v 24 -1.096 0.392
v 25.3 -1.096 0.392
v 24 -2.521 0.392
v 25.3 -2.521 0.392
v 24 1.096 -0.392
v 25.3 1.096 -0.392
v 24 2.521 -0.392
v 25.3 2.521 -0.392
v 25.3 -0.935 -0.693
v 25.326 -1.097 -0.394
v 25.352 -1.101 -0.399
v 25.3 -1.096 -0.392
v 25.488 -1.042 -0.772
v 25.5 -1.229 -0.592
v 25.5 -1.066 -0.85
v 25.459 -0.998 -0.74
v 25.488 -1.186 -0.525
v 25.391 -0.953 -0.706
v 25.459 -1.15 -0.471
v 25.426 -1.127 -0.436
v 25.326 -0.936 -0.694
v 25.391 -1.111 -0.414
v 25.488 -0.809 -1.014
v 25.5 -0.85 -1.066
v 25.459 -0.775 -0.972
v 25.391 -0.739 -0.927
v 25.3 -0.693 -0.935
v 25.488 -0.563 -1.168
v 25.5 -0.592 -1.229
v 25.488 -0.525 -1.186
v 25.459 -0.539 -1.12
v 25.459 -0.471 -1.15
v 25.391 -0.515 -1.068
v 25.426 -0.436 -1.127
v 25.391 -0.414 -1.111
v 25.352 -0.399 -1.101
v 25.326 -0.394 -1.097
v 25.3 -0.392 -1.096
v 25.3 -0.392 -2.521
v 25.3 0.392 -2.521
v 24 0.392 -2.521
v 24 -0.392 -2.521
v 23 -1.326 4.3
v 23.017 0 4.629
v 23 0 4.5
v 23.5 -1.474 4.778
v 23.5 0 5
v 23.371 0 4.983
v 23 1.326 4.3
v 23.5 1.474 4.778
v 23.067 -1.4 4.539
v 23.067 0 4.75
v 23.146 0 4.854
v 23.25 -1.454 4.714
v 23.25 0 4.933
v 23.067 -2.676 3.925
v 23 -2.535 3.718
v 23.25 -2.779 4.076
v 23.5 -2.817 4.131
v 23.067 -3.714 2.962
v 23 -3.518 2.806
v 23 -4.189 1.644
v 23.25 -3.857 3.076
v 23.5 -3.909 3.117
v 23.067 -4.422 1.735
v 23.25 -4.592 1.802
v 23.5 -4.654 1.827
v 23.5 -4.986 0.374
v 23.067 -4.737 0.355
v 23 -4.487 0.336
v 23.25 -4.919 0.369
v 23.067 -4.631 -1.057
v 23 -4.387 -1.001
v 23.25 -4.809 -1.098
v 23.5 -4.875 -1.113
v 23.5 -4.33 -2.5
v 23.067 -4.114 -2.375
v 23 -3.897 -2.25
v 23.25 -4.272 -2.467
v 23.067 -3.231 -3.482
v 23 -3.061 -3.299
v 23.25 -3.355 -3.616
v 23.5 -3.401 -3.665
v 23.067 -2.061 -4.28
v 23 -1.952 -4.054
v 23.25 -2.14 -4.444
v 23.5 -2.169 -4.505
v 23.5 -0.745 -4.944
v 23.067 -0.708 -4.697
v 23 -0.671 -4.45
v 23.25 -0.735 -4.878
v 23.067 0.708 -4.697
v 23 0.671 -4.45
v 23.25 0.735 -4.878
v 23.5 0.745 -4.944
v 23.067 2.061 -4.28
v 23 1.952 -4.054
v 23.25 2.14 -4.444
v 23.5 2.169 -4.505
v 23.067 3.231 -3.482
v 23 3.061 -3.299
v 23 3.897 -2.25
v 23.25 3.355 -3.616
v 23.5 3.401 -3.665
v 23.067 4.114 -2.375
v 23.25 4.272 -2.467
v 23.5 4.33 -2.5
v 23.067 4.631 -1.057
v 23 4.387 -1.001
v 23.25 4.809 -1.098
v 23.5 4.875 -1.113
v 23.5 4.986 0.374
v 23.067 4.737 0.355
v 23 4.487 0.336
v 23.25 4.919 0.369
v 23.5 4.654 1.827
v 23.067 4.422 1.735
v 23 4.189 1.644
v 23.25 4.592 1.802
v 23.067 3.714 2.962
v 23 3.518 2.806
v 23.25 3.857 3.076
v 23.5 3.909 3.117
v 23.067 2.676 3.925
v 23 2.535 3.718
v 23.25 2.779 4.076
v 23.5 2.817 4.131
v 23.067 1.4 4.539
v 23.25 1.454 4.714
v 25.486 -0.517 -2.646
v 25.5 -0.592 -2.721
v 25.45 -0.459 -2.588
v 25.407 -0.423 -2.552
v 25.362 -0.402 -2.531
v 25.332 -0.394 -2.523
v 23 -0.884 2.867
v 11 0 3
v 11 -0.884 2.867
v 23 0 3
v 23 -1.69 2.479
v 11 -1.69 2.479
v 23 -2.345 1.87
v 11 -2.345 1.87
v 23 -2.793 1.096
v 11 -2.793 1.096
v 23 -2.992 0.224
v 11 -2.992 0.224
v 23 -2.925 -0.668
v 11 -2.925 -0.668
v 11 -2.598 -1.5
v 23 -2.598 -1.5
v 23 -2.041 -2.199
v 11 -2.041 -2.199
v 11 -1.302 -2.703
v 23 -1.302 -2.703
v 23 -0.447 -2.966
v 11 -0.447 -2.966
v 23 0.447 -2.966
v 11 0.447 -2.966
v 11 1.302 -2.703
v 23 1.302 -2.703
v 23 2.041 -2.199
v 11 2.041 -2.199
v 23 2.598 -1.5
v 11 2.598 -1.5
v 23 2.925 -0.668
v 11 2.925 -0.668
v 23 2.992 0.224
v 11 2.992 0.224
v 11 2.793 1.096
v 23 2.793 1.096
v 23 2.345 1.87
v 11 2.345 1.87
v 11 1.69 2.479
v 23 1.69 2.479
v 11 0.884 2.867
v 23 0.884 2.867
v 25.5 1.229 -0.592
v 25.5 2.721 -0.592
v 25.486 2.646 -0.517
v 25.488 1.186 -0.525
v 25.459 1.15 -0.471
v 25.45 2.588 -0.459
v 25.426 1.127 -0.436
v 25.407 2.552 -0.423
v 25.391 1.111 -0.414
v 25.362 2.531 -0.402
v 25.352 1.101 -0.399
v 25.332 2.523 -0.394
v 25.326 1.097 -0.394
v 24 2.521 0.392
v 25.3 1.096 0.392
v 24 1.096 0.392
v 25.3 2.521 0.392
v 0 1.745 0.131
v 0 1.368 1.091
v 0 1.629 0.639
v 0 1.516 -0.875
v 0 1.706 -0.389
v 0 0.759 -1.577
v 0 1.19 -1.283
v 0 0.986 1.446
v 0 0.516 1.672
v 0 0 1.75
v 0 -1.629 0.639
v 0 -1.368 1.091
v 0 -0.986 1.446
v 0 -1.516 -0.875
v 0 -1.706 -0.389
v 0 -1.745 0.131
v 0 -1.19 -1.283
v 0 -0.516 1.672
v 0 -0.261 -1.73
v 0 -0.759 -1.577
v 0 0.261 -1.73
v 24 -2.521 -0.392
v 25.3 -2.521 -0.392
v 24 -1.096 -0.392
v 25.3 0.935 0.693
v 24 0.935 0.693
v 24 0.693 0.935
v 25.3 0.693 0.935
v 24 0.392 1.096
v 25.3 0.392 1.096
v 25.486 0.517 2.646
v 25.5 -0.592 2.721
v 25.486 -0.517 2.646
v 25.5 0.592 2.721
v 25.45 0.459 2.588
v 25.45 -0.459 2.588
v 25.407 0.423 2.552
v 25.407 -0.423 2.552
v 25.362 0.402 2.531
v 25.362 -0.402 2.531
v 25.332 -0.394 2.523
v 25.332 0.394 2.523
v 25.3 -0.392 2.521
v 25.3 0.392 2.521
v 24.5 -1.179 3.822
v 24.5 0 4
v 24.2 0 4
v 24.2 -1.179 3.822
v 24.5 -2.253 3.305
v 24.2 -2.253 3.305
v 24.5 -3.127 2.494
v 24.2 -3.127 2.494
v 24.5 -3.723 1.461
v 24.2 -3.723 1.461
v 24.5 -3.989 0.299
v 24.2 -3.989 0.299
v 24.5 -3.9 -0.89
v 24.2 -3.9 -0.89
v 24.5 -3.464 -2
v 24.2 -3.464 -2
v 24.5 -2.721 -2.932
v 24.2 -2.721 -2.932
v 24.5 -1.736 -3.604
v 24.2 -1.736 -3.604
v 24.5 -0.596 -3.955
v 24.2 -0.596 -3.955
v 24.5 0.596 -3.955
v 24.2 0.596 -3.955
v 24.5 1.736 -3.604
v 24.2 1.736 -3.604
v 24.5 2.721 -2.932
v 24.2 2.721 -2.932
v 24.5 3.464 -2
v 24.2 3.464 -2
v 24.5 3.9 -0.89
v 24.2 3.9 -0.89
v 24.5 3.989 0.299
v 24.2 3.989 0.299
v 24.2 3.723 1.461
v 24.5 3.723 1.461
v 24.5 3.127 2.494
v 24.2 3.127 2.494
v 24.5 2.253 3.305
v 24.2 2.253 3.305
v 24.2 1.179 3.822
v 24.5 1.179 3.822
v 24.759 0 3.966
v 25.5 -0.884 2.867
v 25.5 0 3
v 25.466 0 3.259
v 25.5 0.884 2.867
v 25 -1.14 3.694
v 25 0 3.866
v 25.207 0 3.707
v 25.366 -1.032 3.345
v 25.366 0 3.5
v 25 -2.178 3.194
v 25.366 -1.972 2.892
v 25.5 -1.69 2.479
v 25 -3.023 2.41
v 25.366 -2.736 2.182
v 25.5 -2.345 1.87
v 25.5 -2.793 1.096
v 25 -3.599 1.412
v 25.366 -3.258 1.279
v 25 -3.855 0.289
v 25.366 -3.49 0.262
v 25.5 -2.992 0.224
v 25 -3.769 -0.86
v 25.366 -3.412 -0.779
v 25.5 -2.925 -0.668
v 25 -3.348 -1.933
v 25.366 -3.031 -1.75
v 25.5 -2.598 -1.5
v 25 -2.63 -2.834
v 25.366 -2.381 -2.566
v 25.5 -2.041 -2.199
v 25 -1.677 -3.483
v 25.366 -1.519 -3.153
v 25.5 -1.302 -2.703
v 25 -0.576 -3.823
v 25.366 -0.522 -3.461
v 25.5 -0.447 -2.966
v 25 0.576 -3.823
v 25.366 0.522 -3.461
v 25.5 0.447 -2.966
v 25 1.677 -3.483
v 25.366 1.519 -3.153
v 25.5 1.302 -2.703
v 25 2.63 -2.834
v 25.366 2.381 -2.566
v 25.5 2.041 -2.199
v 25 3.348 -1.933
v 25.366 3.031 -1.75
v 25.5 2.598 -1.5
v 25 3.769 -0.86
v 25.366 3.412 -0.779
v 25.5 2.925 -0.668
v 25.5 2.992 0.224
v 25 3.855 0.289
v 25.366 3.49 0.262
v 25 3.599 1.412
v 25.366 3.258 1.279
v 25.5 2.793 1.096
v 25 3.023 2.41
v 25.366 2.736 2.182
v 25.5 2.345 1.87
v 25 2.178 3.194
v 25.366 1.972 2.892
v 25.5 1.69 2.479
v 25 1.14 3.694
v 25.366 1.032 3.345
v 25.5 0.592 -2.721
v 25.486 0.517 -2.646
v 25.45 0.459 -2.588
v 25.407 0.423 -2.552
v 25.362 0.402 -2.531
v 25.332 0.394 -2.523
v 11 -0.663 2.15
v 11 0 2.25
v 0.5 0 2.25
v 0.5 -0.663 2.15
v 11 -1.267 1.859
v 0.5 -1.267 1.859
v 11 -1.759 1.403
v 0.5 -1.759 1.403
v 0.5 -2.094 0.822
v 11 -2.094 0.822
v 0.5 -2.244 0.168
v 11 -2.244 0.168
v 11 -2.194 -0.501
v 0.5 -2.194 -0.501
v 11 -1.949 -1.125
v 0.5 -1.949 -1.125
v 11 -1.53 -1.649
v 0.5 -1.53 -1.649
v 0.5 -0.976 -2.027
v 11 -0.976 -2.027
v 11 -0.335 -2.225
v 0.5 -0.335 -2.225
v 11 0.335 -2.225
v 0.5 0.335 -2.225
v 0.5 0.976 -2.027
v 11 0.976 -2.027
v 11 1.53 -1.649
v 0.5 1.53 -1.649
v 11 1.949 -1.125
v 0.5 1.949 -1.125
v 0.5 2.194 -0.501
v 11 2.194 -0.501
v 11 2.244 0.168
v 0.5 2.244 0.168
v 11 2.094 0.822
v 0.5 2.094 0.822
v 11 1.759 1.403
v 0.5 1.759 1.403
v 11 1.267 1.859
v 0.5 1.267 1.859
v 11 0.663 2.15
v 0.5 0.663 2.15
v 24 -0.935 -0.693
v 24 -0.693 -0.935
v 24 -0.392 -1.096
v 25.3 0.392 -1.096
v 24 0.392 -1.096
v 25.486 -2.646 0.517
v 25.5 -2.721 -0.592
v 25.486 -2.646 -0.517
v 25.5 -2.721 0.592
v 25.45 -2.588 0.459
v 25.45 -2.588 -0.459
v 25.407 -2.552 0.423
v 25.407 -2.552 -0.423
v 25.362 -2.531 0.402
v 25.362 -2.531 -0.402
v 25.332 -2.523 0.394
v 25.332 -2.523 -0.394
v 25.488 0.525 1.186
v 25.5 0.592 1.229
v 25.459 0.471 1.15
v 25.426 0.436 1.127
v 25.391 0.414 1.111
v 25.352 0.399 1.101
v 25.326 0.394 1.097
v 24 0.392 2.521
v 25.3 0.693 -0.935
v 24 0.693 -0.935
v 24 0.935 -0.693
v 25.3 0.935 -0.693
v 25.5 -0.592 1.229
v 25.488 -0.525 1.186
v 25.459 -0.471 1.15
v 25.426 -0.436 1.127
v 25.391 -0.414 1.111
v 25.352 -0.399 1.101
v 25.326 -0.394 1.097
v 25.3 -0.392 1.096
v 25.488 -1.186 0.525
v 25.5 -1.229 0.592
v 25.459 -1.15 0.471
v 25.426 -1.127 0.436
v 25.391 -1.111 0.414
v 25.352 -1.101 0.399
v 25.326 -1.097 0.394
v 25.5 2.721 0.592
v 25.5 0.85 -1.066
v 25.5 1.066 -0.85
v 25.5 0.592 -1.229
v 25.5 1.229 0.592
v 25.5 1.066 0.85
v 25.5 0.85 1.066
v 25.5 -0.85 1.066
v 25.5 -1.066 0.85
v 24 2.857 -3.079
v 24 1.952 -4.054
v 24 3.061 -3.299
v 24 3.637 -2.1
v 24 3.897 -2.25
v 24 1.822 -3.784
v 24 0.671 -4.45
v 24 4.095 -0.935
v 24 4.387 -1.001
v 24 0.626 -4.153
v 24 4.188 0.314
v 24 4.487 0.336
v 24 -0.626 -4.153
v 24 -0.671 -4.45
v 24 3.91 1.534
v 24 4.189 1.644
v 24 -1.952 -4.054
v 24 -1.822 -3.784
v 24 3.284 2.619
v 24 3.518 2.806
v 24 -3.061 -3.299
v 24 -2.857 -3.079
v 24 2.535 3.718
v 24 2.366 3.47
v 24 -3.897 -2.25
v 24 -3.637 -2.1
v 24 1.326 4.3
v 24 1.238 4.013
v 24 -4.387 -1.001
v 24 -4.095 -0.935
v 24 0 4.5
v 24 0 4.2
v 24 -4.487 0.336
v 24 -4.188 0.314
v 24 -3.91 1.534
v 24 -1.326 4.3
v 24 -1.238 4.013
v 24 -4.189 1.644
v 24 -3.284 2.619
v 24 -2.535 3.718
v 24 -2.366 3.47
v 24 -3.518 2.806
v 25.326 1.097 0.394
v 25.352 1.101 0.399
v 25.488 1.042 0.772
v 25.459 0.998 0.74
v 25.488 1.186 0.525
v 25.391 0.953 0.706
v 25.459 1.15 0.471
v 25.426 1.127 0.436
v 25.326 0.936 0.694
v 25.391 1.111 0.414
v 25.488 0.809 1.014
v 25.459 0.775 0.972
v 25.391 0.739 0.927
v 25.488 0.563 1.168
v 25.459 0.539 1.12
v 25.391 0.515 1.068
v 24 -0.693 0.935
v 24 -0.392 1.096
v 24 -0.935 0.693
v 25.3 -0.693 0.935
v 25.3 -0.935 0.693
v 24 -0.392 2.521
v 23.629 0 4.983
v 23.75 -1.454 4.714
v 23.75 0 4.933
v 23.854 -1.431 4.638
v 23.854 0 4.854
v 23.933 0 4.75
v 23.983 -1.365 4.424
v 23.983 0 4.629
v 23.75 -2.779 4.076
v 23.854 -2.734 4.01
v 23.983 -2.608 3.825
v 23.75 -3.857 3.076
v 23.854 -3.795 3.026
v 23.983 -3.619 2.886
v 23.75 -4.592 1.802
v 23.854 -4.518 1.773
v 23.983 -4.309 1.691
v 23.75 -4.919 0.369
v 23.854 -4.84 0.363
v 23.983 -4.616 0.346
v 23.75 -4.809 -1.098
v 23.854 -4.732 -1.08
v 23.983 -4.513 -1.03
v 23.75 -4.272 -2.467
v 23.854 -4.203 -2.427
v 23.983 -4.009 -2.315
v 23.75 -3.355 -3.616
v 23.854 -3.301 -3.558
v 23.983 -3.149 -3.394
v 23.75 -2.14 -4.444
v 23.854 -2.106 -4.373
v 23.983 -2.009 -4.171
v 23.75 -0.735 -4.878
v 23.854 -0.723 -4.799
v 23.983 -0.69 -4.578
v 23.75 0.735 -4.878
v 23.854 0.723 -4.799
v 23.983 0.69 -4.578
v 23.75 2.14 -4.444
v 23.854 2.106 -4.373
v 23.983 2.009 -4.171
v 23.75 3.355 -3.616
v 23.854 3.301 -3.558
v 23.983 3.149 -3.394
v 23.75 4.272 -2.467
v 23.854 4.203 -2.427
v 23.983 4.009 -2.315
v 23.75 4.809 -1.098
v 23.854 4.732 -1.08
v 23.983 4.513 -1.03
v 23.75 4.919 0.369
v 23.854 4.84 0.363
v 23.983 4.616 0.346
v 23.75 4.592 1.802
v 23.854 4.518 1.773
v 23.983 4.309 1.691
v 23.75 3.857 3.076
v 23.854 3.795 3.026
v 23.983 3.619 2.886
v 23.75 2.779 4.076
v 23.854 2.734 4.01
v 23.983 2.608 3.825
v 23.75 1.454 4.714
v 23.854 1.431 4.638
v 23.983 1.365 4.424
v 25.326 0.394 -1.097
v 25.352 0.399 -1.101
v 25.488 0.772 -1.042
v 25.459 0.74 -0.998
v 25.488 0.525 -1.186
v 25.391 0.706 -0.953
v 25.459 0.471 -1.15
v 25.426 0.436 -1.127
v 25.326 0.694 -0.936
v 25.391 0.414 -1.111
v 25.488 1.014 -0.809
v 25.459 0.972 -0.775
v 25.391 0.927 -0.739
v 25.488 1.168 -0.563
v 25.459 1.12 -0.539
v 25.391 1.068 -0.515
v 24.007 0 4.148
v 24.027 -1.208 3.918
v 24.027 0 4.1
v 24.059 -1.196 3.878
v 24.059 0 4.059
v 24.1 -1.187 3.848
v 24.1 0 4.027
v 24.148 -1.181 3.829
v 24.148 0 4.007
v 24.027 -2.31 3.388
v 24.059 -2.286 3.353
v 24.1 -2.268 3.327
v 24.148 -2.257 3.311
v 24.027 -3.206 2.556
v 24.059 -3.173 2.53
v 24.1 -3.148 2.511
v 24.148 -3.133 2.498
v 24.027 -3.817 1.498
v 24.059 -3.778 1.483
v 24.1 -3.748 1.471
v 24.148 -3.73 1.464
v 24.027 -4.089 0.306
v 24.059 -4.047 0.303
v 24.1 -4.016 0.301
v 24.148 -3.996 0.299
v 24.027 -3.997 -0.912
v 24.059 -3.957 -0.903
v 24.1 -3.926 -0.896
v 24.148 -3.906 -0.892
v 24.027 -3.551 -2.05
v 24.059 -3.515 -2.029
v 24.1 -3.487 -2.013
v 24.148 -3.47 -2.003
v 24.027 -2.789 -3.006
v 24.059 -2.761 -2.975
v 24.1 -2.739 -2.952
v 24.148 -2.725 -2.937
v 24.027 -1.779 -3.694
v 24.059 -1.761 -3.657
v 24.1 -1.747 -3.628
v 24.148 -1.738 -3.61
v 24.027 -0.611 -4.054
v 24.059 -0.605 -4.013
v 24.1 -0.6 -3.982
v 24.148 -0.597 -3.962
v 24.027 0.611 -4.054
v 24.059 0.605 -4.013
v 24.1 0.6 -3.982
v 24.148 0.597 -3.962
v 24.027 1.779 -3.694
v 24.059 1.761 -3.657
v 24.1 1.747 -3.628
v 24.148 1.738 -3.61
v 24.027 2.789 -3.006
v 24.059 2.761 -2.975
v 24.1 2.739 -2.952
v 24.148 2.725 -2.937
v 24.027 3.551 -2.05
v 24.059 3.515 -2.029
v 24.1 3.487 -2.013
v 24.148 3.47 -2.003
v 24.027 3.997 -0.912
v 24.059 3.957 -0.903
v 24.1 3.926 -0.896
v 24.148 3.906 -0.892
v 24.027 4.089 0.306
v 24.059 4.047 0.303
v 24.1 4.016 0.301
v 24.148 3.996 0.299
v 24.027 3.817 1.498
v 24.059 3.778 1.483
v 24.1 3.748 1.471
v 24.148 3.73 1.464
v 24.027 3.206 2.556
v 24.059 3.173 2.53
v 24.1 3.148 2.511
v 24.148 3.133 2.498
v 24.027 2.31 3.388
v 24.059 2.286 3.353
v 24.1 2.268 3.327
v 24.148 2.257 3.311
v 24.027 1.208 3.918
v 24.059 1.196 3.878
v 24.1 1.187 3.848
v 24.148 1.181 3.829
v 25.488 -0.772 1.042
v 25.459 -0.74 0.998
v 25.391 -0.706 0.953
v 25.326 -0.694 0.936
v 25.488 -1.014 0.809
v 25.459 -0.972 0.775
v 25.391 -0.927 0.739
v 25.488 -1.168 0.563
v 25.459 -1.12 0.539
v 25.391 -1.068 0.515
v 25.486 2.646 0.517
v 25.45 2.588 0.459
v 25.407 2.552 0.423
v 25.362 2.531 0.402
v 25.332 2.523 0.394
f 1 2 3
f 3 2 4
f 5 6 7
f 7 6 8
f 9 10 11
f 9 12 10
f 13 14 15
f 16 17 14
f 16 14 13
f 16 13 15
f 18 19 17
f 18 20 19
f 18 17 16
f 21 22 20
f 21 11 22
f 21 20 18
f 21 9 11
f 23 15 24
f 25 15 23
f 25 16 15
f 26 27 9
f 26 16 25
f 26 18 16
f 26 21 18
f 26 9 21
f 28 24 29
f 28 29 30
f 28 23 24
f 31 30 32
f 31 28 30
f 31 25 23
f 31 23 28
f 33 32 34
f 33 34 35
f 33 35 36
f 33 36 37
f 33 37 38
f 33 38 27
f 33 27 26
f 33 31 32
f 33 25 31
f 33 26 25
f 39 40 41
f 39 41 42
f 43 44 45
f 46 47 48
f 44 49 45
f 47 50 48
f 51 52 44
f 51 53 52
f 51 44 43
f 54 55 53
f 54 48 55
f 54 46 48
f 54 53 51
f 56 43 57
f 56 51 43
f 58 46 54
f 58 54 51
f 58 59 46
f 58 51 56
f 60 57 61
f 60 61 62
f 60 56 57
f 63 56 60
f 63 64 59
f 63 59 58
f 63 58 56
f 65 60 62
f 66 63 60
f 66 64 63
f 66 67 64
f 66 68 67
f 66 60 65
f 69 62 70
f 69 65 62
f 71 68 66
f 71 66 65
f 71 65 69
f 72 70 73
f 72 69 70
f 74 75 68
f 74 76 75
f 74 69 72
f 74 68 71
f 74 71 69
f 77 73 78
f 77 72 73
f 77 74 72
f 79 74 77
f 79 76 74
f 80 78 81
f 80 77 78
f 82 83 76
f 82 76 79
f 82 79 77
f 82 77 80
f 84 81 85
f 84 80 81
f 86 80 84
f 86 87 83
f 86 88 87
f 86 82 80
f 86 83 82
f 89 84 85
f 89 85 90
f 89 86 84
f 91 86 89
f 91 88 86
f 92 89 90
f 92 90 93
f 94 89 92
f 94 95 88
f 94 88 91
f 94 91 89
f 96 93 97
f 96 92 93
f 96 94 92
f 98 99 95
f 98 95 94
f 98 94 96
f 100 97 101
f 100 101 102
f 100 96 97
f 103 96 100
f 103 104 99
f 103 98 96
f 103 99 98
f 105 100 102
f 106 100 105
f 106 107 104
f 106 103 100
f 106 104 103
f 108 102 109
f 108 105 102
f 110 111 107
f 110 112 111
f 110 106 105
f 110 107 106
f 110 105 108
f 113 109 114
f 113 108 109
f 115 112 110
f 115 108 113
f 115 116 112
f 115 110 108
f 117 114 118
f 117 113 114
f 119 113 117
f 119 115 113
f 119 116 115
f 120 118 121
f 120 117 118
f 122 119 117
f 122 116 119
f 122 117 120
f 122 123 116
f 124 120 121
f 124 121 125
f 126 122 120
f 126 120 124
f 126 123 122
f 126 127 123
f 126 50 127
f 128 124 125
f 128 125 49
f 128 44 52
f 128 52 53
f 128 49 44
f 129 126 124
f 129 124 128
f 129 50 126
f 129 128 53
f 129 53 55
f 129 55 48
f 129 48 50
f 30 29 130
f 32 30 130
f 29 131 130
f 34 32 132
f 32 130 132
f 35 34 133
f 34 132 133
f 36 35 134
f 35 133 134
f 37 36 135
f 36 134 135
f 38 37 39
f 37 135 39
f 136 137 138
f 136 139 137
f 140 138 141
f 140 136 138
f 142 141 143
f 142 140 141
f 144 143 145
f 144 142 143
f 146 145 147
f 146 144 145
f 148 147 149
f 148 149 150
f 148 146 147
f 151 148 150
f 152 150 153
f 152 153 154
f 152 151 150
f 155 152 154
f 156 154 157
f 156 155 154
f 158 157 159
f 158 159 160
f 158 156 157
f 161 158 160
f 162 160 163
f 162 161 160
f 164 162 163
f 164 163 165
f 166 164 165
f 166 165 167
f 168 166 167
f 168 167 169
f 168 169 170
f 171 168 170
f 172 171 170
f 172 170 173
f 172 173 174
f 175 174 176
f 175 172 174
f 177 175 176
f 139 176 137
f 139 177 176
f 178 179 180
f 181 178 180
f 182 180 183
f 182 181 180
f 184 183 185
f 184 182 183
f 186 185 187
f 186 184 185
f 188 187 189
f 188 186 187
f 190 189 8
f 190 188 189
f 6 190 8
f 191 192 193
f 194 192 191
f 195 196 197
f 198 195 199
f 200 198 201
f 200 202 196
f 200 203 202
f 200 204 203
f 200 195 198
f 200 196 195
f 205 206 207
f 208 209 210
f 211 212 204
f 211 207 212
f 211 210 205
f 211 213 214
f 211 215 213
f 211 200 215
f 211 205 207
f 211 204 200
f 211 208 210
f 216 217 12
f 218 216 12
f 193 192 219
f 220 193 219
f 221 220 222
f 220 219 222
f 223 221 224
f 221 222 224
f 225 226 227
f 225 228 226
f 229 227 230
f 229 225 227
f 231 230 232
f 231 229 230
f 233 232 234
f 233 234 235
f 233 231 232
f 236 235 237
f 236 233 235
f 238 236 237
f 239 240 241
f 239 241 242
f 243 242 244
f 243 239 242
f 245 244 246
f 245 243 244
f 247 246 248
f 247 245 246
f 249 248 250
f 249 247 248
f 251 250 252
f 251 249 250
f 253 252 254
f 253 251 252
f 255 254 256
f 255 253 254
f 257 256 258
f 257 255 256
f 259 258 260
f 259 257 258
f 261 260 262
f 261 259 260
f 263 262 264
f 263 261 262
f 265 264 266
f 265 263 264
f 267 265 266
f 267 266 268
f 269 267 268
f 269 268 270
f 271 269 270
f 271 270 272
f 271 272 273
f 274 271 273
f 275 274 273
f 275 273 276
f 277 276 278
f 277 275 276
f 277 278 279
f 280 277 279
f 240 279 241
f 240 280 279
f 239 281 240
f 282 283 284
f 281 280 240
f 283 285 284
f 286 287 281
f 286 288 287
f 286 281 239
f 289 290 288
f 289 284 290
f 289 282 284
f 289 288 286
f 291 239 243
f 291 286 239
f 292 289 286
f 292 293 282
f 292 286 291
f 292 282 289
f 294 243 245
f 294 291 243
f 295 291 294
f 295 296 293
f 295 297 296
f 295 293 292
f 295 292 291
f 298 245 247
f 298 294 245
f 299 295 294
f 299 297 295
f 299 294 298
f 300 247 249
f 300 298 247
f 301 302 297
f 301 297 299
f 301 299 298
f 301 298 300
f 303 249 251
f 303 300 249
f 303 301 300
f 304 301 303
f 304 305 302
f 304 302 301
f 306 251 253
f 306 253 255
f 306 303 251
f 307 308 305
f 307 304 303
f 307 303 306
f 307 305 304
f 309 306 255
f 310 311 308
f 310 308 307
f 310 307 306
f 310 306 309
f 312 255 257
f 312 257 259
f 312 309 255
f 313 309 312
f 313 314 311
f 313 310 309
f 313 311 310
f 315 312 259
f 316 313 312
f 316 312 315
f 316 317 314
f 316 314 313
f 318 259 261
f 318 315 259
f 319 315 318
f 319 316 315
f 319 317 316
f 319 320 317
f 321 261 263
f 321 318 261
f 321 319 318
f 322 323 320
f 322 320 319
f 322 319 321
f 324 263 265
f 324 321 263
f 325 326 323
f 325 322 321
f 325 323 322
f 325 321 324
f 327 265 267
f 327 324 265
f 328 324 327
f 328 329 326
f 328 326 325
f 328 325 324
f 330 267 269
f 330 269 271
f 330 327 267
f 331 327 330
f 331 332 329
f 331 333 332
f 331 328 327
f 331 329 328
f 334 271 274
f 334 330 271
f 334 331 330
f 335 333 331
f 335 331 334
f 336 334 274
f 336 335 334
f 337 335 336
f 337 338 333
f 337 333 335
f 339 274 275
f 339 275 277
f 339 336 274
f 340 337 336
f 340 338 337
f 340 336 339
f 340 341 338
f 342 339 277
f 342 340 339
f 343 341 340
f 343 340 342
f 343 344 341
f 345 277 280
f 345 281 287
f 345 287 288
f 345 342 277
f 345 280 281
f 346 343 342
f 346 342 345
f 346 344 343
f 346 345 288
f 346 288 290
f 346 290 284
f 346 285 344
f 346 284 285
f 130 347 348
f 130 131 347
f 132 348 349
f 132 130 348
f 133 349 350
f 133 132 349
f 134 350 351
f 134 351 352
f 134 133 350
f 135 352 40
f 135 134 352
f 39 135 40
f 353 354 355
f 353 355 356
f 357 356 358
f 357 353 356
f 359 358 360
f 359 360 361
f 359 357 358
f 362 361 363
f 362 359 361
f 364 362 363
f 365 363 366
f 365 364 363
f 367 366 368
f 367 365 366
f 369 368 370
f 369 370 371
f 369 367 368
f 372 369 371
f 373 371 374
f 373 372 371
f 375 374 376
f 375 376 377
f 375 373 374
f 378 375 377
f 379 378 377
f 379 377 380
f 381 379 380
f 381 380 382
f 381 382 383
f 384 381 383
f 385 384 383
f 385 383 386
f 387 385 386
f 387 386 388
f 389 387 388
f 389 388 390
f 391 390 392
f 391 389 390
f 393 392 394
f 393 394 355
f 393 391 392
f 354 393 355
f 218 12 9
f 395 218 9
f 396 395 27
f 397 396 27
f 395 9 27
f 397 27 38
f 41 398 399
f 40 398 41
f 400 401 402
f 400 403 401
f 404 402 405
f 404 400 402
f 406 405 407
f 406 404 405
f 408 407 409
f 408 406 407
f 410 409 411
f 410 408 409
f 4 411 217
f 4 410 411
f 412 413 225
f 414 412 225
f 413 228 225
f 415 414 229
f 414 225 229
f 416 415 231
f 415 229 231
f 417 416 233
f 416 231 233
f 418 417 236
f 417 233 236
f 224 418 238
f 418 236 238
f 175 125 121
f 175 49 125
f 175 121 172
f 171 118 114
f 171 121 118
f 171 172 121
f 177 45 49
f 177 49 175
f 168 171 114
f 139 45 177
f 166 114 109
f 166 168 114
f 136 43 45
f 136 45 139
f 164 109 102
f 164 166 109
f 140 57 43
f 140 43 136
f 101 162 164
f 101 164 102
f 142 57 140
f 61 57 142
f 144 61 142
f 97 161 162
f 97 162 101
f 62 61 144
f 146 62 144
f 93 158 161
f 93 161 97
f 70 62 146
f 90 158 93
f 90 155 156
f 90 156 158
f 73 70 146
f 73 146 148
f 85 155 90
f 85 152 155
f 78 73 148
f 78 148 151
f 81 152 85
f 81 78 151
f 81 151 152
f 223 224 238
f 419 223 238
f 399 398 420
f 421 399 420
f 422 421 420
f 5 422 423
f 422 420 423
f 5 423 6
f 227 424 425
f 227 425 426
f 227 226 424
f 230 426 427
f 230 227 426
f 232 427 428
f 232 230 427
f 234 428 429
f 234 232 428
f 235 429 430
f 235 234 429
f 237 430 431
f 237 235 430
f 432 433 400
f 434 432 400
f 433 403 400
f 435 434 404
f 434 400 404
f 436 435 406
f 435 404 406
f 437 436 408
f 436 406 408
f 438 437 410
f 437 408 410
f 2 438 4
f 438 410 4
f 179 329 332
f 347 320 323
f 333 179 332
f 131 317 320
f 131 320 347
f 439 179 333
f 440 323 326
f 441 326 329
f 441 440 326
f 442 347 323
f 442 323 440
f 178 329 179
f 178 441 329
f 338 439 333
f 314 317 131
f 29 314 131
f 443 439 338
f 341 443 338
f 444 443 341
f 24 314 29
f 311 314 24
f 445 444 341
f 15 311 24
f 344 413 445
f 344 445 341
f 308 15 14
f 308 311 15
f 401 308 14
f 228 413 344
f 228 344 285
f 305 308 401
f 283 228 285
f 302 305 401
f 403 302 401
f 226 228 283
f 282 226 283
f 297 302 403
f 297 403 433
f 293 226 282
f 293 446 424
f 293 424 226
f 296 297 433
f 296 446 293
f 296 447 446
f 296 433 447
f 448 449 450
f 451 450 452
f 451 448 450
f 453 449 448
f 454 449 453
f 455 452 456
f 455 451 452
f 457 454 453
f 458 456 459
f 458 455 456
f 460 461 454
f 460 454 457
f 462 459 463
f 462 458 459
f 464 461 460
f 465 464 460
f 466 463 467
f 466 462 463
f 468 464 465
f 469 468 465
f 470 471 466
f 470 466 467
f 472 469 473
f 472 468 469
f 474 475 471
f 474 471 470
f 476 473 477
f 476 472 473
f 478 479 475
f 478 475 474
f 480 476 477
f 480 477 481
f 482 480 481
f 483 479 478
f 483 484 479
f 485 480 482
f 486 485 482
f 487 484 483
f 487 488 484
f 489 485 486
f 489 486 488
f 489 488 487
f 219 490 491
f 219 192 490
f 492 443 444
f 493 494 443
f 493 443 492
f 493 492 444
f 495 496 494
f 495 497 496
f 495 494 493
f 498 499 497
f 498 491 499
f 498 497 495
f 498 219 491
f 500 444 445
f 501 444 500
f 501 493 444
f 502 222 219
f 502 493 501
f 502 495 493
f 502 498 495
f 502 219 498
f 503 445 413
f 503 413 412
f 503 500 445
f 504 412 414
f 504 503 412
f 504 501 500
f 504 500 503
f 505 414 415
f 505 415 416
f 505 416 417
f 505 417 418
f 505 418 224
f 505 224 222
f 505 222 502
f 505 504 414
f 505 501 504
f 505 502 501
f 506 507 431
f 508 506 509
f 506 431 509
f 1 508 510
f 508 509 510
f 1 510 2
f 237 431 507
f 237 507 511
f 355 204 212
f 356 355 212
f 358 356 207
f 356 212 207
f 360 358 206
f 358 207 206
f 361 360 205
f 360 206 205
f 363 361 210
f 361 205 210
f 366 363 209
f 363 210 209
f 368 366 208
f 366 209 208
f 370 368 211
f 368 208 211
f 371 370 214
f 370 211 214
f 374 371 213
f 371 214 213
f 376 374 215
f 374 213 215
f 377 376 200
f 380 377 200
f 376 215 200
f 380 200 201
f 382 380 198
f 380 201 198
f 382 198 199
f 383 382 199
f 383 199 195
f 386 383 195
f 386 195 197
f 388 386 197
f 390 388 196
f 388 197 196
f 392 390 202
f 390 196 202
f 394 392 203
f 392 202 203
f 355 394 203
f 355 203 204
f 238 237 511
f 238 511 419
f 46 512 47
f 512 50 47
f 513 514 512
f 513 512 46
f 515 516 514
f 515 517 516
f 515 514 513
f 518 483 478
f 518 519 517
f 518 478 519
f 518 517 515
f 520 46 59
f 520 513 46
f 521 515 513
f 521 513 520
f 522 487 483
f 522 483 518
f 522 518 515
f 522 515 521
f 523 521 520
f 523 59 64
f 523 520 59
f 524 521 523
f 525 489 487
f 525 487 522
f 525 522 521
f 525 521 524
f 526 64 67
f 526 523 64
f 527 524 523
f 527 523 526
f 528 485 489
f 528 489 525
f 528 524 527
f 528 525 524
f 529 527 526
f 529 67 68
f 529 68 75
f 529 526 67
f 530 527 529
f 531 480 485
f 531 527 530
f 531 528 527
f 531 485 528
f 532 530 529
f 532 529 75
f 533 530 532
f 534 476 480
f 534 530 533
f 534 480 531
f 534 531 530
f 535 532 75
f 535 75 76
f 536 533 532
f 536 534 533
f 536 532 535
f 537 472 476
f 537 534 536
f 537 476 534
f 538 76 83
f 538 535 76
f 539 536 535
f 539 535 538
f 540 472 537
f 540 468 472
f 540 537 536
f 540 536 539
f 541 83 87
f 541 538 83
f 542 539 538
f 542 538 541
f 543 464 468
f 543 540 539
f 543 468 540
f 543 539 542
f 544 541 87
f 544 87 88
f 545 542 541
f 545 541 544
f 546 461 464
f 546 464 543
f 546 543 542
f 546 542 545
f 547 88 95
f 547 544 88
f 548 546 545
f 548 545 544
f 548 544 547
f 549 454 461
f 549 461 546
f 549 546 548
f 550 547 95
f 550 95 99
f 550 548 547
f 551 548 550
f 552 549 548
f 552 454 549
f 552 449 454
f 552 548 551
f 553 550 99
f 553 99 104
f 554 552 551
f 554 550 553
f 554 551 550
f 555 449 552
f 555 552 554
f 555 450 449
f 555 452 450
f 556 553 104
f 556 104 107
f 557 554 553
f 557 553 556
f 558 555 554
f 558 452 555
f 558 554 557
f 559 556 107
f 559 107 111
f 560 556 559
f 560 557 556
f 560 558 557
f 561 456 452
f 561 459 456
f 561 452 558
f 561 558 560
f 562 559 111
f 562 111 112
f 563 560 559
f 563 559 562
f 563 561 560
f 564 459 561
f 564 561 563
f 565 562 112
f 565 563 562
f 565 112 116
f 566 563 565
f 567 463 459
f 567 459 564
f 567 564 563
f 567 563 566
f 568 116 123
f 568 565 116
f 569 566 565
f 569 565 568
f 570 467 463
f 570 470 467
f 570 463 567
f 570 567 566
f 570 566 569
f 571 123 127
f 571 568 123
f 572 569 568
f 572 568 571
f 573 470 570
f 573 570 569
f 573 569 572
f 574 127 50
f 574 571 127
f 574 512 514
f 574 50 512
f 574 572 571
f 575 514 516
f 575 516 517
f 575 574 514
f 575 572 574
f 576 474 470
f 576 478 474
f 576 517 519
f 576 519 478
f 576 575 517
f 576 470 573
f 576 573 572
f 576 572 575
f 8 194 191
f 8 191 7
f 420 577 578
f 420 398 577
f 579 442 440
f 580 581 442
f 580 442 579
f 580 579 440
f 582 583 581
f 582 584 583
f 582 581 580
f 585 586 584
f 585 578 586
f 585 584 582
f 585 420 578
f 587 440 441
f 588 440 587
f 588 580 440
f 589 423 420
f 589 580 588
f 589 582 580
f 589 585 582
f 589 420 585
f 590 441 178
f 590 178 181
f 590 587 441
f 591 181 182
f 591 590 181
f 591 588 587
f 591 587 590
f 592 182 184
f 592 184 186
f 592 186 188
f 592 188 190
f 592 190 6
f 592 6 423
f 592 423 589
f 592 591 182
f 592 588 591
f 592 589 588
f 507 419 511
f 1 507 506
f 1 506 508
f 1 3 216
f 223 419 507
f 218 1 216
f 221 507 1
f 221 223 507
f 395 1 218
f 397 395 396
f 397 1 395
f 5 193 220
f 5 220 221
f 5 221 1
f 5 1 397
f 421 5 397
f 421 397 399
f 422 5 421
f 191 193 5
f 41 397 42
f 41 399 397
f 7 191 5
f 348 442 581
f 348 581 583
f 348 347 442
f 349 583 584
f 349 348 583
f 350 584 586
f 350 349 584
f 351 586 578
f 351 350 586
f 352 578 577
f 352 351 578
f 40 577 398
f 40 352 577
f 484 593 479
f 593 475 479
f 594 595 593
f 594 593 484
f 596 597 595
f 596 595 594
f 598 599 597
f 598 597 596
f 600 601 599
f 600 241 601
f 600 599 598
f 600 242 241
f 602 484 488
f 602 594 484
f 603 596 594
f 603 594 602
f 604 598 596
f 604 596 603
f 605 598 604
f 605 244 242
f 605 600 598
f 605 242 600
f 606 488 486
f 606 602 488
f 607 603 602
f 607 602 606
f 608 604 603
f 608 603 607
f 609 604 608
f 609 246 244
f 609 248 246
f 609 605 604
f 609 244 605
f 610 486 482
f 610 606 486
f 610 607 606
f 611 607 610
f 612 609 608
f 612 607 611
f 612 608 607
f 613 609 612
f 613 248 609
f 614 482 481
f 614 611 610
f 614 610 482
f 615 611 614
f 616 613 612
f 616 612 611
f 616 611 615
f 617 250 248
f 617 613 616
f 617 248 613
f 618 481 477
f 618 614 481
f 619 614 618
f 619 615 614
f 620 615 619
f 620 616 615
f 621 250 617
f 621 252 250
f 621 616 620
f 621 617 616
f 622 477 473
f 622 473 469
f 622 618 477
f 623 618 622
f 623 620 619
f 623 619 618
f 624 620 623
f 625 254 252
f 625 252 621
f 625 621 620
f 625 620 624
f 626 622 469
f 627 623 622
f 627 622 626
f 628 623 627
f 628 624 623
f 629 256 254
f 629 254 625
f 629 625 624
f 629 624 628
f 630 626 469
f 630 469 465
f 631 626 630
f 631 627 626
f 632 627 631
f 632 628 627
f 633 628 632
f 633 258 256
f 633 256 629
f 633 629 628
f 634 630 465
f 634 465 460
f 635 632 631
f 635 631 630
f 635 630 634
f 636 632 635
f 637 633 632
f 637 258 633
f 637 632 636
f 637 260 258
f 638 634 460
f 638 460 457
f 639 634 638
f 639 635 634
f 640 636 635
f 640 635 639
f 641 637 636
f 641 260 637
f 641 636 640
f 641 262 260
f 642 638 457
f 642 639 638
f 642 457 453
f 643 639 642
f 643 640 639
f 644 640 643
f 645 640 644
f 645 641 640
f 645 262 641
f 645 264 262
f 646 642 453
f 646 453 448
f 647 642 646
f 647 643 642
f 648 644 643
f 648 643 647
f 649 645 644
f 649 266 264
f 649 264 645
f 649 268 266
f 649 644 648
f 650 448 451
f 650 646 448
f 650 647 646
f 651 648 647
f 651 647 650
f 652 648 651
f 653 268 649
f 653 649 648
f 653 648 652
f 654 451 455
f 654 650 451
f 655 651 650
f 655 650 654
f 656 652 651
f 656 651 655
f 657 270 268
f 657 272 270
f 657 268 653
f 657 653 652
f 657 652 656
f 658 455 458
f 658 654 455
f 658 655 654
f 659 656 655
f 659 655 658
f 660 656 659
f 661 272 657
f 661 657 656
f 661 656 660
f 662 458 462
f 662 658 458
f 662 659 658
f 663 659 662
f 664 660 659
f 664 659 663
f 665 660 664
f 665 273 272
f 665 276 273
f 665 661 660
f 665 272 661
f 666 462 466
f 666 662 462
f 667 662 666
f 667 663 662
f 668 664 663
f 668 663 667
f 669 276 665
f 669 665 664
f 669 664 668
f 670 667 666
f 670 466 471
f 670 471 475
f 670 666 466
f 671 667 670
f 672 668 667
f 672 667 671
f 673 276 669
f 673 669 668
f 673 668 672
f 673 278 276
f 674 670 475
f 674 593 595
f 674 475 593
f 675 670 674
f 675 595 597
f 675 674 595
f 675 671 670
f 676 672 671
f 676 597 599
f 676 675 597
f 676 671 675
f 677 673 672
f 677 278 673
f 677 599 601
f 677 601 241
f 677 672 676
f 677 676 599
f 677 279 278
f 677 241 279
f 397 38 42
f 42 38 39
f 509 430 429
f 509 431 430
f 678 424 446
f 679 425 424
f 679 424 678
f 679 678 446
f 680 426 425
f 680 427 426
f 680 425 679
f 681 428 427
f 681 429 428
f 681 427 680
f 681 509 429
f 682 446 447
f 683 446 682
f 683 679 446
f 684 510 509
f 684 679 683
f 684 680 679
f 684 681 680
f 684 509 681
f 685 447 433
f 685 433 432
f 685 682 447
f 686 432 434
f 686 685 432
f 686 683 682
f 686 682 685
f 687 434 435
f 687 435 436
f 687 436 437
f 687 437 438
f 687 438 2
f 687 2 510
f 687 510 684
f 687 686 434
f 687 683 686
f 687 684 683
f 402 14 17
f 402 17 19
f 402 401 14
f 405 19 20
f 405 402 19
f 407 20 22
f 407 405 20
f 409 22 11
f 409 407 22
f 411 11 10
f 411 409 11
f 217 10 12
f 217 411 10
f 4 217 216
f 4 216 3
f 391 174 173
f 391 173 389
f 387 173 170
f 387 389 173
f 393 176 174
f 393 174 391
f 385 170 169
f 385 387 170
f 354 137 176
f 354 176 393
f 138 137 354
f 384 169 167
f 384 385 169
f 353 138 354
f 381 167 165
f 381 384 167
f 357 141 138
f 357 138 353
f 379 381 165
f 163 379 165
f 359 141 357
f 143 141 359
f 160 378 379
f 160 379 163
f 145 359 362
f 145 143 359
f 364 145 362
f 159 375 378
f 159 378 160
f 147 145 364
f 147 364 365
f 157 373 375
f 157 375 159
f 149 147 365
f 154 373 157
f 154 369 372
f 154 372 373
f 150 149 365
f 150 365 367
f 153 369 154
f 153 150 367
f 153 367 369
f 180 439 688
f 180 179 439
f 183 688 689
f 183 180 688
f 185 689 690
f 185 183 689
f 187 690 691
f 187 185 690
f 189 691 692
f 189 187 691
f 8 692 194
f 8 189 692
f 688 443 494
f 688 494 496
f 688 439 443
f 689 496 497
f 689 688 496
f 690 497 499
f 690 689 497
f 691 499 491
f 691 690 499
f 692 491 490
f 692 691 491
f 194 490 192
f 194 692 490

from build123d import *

# Parameters (mm, degrees)
CONG_1_R                     = 0.5
CONG_2_R                     = 0.2
ESQUISSE2_W                  = 0.783604582
ESQUISSE2_H                  = 2.520970871
ENL_V_MAT_EXTRU_1_DEPTH      = 1.5
R_P_TITION_CIRCULAIRE1_COUNT = 4
ESQUISSE3_R                  = 1.163963939
ENL_V_MAT_EXTRU_2_DEPTH      = 1.5
CONG_3_R                     = 0.2
CHANFREIN1_SIZE              = 0.5


with BuildPart() as part:
    # Esquisse1 → Révolution1 (revolve)
    with BuildSketch(Plane.XY, mode=Mode.PRIVATE) as r_volution1_sk:
        with BuildLine():
            Line((0, 0), (0, 2.25))
            Line((0, 2.25), (11, 2.25))
            Line((11, 2.25), (11, 3))
            Line((11, 3), (23, 3))
            Line((23, 3), (23, 5))
            Line((23, 5), (24, 5))
            Line((24, 5), (24, 4))
            Line((24, 4), (24.5, 4))
            ThreePointArc((24.5, 4), (25.207106781, 3.707106781), (25.5, 3))
            Line((25.5, 3), (25.5, 0))
            Line((25.5, 0), (0, 0))
        make_face()
    revolve(r_volution1_sk.sketch.rotate(Axis((0, 0, 0), (1, 0, 0)), 90), axis=Axis((0, 0, 0), (1, 0, 0)))

    # Congé1
    # the kernel refuses this fillet: 0.5 mm, written as the material it takes off along each edge
    with BuildSketch(Plane(origin=(23, 0, 0), x_dir=(0, 0, 1), z_dir=(0, 1, 0))) as cong_1_piece_1:
        with BuildLine():
            CenterArc((5 - CONG_1_R, CONG_1_R), CONG_1_R, 270, 90)
            Line((5, CONG_1_R), (5 + CONG_1_R * 0.02, CONG_1_R))
            Line((5 + CONG_1_R * 0.02, CONG_1_R), (5 + CONG_1_R * 0.02, -CONG_1_R * 0.02))
            Line((5 + CONG_1_R * 0.02, -CONG_1_R * 0.02), (5 - CONG_1_R, -CONG_1_R * 0.02))
            Line((5 - CONG_1_R, -CONG_1_R * 0.02), (5 - CONG_1_R, 0))
        make_face()
    revolve(axis=Axis((23, 0, 0), (1, 0, 0)), mode=Mode.SUBTRACT)
    with BuildSketch(Plane(origin=(24, 0, 0), x_dir=(0, 0, 1), z_dir=(0, 1, 0))) as cong_1_piece_2:
        with BuildLine():
            CenterArc((5 - CONG_1_R, -CONG_1_R), CONG_1_R, 0, 90)
            Line((5 - CONG_1_R, 0), (5 - CONG_1_R, CONG_1_R * 0.02))
            Line((5 - CONG_1_R, CONG_1_R * 0.02), (5 + CONG_1_R * 0.02, CONG_1_R * 0.02))
            Line((5 + CONG_1_R * 0.02, CONG_1_R * 0.02), (5 + CONG_1_R * 0.02, -CONG_1_R))
            Line((5 + CONG_1_R * 0.02, -CONG_1_R), (5, -CONG_1_R))
        make_face()
    revolve(axis=Axis((24, 0, 0), (1, 0, 0)), mode=Mode.SUBTRACT)

    # Congé2
    cong_2_edges = [part.edges().sort_by_distance(p)[0] for p in [
        (24, 0, -4),
    ]]
    fillet(cong_2_edges, radius=CONG_2_R)

    # Esquisse2 → Enlèv. mat.-Extru.1 (cut)
    with BuildSketch(Plane(origin=(25.5, 0, 0), x_dir=(0, 0, -1), z_dir=(1, 0, 0))):
        with Locations((0, 1.260485436)):
            Rectangle(ESQUISSE2_W, ESQUISSE2_H)
    enl_v_mat_extru_1 = extrude(amount=-ENL_V_MAT_EXTRU_1_DEPTH, mode=Mode.SUBTRACT)

    # Répétition circulaire1: Enlèv. mat.-Extru.1 ×4 about axis
    r_p_tition_circulaire1_axis = Axis((0, 0, 0), (1, 0, 0))
    for i in range(1, R_P_TITION_CIRCULAIRE1_COUNT):
        add(enl_v_mat_extru_1.rotate(r_p_tition_circulaire1_axis, i * 360 / R_P_TITION_CIRCULAIRE1_COUNT), mode=Mode.SUBTRACT)

    # Esquisse3 → Enlèv. mat.-Extru.2 (cut)
    with BuildSketch(Plane(origin=(25.5, 0, 0), x_dir=(0, 0, -1), z_dir=(1, 0, 0))):
        Circle(ESQUISSE3_R)
    extrude(amount=-ENL_V_MAT_EXTRU_2_DEPTH, mode=Mode.SUBTRACT)

    # Congé3
    cong_3_edges = [part.edges().sort_by_distance(p)[0] for p in [
        (25.5, 0, 2.520970871),
        (25.5, -0.391802291, 1.808505284),
        (25.5, -0.823046794, 0.823046794),
        (25.5, -1.808505284, 0.391802291),
        (25.5, -2.520970871, 0),
        (25.5, -1.808505284, -0.391802291),
        (25.5, -0.823046794, -0.823046794),
        (25.5, -0.391802291, -1.808505284),
        (25.5, 0, -2.520970871),
        (25.5, 0.391802291, -1.808505284),
        (25.5, 0.823046794, -0.823046794),
        (25.5, 1.808505284, -0.391802291),
        (25.5, 2.520970871, 0),
        (25.5, 1.808505284, 0.391802291),
        (25.5, 0.823046794, 0.823046794),
        (25.5, 0.391802291, 1.808505284),
    ]]
    fillet(cong_3_edges, radius=CONG_3_R)

    # Chanfrein1
    chanfrein1_edges = [part.edges().sort_by_distance(p)[0] for p in [
        (0, 0, -2.25),
    ]]
    chamfer(chanfrein1_edges, length=CHANFREIN1_SIZE)


solid = part.part
